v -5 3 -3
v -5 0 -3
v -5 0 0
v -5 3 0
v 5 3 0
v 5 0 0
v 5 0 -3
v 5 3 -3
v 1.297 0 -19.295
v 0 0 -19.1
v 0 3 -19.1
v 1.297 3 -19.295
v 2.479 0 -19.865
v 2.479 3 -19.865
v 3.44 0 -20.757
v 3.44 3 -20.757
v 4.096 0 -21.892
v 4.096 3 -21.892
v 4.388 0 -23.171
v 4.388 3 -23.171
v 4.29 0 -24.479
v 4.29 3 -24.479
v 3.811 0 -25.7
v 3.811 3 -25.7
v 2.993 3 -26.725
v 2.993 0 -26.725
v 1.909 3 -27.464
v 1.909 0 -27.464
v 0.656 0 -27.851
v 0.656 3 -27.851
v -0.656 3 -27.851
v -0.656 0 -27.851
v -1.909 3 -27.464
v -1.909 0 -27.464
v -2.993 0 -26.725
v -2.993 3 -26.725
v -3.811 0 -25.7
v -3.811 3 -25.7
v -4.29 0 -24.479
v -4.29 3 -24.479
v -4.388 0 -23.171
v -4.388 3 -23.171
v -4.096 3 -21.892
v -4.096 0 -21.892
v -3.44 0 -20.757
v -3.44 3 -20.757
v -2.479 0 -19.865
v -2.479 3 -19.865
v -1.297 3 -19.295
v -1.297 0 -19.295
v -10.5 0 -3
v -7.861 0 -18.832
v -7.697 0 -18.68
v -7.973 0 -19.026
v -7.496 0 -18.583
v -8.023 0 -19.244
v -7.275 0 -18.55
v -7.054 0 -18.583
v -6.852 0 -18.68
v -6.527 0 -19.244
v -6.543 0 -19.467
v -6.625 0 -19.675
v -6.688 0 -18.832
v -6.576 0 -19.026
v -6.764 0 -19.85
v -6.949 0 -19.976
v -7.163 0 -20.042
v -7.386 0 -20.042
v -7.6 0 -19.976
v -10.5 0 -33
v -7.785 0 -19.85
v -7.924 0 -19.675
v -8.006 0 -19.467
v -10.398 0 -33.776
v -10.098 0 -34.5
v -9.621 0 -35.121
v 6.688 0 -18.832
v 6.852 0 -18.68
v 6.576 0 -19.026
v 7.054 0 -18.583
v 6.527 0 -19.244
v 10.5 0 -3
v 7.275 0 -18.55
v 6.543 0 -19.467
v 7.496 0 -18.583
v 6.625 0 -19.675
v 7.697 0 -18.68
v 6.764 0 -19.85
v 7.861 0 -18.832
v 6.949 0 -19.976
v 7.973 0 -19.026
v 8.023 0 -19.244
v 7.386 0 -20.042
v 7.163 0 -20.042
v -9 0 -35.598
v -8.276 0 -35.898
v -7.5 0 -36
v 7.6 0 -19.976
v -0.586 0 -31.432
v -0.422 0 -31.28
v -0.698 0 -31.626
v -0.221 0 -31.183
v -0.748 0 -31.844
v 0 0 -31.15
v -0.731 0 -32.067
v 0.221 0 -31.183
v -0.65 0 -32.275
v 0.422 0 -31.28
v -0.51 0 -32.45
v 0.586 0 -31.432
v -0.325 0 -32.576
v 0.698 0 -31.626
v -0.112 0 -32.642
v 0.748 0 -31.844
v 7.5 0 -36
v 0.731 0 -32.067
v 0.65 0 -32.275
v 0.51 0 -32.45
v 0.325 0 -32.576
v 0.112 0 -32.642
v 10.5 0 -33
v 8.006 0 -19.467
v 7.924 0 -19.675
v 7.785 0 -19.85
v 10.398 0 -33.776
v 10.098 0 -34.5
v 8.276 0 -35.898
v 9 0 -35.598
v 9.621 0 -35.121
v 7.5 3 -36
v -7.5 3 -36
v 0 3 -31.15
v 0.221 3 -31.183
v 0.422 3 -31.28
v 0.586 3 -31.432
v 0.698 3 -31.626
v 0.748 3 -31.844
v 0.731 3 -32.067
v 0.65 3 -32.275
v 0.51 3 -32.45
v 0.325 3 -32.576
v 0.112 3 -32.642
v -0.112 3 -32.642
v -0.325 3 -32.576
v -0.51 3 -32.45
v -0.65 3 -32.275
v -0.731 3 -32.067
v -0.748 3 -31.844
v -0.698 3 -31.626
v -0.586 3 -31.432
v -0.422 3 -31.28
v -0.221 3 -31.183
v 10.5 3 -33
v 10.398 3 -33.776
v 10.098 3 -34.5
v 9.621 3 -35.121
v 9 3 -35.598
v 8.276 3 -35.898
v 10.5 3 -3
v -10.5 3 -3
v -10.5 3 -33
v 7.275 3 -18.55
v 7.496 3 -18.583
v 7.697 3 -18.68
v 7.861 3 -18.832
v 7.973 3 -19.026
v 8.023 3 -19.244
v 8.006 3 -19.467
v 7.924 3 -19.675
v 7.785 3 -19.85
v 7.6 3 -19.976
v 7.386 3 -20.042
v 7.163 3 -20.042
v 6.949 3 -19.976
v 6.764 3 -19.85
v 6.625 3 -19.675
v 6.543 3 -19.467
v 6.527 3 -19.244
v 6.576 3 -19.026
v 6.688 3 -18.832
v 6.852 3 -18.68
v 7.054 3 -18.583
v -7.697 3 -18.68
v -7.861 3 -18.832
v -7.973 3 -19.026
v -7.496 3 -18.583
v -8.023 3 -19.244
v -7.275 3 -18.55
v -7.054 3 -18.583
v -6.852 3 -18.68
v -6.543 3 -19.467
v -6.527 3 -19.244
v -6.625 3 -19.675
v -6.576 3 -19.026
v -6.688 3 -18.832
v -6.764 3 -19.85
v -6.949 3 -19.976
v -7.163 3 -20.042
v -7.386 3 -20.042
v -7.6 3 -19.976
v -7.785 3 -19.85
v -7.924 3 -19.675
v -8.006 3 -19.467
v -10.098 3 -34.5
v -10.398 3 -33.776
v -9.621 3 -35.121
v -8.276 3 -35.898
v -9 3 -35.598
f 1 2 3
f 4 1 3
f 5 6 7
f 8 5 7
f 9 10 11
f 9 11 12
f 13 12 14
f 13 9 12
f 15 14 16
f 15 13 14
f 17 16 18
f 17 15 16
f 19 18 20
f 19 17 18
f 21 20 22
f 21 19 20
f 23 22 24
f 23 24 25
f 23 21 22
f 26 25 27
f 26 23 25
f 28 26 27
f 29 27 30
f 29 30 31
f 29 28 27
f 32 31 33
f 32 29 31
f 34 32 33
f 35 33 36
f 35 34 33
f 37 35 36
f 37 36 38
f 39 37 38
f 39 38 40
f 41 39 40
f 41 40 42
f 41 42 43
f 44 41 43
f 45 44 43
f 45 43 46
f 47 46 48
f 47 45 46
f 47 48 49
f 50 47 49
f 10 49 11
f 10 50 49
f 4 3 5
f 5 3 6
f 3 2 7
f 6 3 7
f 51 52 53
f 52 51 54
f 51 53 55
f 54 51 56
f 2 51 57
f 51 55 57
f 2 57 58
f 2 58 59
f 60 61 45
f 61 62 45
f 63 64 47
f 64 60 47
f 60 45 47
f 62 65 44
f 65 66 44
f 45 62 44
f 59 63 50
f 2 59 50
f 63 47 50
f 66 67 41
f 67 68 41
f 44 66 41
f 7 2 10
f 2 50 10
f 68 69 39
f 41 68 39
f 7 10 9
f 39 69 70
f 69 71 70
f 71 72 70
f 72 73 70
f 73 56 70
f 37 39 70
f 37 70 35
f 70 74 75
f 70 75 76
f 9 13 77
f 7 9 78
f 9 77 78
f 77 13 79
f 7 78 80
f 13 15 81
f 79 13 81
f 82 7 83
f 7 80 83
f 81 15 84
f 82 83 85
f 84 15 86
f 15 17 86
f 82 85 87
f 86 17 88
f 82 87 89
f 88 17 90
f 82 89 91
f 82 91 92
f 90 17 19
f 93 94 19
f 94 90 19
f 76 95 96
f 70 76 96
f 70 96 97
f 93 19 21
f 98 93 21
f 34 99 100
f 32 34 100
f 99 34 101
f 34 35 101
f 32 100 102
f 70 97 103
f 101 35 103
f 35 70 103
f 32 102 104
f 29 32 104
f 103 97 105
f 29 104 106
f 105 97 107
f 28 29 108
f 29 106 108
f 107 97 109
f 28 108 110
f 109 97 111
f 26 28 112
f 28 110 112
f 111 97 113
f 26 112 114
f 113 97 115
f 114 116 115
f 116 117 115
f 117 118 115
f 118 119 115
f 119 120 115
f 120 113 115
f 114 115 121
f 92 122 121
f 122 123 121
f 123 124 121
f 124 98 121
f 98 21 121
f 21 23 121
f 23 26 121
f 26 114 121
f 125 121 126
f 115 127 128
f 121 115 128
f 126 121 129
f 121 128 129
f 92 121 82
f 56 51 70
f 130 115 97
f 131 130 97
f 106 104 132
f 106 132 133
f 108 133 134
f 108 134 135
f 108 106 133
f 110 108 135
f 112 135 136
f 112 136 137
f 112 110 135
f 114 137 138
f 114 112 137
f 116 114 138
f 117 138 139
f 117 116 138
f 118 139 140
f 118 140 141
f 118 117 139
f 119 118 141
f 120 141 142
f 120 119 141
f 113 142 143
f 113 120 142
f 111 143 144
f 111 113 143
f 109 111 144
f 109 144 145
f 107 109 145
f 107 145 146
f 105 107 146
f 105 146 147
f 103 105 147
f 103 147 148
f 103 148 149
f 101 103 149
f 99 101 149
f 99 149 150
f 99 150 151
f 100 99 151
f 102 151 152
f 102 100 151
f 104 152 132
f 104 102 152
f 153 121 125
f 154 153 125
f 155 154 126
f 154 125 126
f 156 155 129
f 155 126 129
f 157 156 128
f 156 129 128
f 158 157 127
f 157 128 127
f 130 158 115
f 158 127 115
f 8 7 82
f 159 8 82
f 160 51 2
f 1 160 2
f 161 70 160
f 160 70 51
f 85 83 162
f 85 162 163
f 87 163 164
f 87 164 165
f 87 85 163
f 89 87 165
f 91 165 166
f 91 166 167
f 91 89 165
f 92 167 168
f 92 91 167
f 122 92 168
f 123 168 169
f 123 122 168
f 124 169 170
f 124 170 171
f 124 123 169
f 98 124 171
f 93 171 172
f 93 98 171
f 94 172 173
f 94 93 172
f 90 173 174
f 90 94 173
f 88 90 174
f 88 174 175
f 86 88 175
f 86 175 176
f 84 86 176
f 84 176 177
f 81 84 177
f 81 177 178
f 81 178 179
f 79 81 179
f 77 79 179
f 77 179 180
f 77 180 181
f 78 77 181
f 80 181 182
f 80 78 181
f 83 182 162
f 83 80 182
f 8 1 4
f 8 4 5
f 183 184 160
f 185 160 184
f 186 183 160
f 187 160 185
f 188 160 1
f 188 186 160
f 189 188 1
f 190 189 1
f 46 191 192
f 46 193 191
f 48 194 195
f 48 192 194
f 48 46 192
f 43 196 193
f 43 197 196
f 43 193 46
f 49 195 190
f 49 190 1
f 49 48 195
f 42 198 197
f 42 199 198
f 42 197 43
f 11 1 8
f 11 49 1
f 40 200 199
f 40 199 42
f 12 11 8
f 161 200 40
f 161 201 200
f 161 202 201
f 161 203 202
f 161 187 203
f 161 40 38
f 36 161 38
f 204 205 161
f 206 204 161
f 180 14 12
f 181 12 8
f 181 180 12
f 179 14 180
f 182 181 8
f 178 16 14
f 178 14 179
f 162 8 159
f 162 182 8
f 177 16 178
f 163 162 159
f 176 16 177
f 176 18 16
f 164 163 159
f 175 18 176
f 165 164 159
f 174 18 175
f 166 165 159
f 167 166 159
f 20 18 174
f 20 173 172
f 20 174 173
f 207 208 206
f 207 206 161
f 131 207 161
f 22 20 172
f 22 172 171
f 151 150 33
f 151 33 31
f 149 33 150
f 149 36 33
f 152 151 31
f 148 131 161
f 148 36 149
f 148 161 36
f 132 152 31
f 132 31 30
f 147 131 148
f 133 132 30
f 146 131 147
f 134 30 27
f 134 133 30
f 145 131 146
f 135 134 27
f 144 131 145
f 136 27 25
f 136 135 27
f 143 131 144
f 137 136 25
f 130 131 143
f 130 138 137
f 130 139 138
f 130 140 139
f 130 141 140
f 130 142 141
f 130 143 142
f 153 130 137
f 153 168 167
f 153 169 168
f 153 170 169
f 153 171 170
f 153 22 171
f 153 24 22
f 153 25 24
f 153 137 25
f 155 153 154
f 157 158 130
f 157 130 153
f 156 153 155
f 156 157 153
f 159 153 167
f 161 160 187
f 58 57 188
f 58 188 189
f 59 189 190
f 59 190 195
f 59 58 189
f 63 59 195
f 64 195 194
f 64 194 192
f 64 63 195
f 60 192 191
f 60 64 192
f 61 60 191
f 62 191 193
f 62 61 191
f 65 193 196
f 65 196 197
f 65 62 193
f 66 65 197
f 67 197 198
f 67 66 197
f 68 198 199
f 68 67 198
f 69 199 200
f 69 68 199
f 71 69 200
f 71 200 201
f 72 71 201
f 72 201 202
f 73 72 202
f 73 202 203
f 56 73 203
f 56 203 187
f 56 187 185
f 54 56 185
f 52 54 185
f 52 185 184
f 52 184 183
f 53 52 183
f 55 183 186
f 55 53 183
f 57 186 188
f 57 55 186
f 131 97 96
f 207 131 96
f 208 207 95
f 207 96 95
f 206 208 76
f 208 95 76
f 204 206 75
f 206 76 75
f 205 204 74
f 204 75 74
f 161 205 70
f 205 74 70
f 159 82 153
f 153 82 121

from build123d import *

# Parameters (mm, degrees)
ESQUISSE1_R        = 4.4
ESQUISSE1_R_2      = 0.75
BOSS_EXTRU_1_DEPTH = 3


with BuildPart() as part:
    # Esquisse1 → Boss.-Extru.1 (new body)
    with BuildSketch(Plane(origin=(0, 0, 0), x_dir=(1, 0, 0), z_dir=(0, 1, 0))):
        with BuildLine():
            Line((-10.5, 3), (-5, 3))
            Line((-5, 3), (-5, 0))
            Line((-5, 0), (5, 0))
            Line((5, 0), (5, 3))
            Line((5, 3), (10.5, 3))
            Line((10.5, 3), (10.5, 33))
            ThreePointArc((10.5, 33), (9.621320344, 35.121320344), (7.5, 36))
            Line((7.5, 36), (-7.5, 36))
            ThreePointArc((-7.5, 36), (-9.621320344, 35.121320344), (-10.5, 33))
            Line((-10.5, 33), (-10.5, 3))
        make_face()
        with Locations(Location((0, 23.5, 0), (0, 0, 270))):
            Circle(ESQUISSE1_R, mode=Mode.SUBTRACT)
        with Locations(Location((0, 31.9, 0), (0, 0, 270))):
            Circle(ESQUISSE1_R_2, mode=Mode.SUBTRACT)
        with Locations(Location((7.274613392, 19.3, 0), (0, 0, 270))):
            Circle(ESQUISSE1_R_2, mode=Mode.SUBTRACT)
        with Locations(Location((-7.274613392, 19.3, 0), (0, 0, 270))):
            Circle(ESQUISSE1_R_2, mode=Mode.SUBTRACT)
    extrude(amount=BOSS_EXTRU_1_DEPTH)


solid = part.part
